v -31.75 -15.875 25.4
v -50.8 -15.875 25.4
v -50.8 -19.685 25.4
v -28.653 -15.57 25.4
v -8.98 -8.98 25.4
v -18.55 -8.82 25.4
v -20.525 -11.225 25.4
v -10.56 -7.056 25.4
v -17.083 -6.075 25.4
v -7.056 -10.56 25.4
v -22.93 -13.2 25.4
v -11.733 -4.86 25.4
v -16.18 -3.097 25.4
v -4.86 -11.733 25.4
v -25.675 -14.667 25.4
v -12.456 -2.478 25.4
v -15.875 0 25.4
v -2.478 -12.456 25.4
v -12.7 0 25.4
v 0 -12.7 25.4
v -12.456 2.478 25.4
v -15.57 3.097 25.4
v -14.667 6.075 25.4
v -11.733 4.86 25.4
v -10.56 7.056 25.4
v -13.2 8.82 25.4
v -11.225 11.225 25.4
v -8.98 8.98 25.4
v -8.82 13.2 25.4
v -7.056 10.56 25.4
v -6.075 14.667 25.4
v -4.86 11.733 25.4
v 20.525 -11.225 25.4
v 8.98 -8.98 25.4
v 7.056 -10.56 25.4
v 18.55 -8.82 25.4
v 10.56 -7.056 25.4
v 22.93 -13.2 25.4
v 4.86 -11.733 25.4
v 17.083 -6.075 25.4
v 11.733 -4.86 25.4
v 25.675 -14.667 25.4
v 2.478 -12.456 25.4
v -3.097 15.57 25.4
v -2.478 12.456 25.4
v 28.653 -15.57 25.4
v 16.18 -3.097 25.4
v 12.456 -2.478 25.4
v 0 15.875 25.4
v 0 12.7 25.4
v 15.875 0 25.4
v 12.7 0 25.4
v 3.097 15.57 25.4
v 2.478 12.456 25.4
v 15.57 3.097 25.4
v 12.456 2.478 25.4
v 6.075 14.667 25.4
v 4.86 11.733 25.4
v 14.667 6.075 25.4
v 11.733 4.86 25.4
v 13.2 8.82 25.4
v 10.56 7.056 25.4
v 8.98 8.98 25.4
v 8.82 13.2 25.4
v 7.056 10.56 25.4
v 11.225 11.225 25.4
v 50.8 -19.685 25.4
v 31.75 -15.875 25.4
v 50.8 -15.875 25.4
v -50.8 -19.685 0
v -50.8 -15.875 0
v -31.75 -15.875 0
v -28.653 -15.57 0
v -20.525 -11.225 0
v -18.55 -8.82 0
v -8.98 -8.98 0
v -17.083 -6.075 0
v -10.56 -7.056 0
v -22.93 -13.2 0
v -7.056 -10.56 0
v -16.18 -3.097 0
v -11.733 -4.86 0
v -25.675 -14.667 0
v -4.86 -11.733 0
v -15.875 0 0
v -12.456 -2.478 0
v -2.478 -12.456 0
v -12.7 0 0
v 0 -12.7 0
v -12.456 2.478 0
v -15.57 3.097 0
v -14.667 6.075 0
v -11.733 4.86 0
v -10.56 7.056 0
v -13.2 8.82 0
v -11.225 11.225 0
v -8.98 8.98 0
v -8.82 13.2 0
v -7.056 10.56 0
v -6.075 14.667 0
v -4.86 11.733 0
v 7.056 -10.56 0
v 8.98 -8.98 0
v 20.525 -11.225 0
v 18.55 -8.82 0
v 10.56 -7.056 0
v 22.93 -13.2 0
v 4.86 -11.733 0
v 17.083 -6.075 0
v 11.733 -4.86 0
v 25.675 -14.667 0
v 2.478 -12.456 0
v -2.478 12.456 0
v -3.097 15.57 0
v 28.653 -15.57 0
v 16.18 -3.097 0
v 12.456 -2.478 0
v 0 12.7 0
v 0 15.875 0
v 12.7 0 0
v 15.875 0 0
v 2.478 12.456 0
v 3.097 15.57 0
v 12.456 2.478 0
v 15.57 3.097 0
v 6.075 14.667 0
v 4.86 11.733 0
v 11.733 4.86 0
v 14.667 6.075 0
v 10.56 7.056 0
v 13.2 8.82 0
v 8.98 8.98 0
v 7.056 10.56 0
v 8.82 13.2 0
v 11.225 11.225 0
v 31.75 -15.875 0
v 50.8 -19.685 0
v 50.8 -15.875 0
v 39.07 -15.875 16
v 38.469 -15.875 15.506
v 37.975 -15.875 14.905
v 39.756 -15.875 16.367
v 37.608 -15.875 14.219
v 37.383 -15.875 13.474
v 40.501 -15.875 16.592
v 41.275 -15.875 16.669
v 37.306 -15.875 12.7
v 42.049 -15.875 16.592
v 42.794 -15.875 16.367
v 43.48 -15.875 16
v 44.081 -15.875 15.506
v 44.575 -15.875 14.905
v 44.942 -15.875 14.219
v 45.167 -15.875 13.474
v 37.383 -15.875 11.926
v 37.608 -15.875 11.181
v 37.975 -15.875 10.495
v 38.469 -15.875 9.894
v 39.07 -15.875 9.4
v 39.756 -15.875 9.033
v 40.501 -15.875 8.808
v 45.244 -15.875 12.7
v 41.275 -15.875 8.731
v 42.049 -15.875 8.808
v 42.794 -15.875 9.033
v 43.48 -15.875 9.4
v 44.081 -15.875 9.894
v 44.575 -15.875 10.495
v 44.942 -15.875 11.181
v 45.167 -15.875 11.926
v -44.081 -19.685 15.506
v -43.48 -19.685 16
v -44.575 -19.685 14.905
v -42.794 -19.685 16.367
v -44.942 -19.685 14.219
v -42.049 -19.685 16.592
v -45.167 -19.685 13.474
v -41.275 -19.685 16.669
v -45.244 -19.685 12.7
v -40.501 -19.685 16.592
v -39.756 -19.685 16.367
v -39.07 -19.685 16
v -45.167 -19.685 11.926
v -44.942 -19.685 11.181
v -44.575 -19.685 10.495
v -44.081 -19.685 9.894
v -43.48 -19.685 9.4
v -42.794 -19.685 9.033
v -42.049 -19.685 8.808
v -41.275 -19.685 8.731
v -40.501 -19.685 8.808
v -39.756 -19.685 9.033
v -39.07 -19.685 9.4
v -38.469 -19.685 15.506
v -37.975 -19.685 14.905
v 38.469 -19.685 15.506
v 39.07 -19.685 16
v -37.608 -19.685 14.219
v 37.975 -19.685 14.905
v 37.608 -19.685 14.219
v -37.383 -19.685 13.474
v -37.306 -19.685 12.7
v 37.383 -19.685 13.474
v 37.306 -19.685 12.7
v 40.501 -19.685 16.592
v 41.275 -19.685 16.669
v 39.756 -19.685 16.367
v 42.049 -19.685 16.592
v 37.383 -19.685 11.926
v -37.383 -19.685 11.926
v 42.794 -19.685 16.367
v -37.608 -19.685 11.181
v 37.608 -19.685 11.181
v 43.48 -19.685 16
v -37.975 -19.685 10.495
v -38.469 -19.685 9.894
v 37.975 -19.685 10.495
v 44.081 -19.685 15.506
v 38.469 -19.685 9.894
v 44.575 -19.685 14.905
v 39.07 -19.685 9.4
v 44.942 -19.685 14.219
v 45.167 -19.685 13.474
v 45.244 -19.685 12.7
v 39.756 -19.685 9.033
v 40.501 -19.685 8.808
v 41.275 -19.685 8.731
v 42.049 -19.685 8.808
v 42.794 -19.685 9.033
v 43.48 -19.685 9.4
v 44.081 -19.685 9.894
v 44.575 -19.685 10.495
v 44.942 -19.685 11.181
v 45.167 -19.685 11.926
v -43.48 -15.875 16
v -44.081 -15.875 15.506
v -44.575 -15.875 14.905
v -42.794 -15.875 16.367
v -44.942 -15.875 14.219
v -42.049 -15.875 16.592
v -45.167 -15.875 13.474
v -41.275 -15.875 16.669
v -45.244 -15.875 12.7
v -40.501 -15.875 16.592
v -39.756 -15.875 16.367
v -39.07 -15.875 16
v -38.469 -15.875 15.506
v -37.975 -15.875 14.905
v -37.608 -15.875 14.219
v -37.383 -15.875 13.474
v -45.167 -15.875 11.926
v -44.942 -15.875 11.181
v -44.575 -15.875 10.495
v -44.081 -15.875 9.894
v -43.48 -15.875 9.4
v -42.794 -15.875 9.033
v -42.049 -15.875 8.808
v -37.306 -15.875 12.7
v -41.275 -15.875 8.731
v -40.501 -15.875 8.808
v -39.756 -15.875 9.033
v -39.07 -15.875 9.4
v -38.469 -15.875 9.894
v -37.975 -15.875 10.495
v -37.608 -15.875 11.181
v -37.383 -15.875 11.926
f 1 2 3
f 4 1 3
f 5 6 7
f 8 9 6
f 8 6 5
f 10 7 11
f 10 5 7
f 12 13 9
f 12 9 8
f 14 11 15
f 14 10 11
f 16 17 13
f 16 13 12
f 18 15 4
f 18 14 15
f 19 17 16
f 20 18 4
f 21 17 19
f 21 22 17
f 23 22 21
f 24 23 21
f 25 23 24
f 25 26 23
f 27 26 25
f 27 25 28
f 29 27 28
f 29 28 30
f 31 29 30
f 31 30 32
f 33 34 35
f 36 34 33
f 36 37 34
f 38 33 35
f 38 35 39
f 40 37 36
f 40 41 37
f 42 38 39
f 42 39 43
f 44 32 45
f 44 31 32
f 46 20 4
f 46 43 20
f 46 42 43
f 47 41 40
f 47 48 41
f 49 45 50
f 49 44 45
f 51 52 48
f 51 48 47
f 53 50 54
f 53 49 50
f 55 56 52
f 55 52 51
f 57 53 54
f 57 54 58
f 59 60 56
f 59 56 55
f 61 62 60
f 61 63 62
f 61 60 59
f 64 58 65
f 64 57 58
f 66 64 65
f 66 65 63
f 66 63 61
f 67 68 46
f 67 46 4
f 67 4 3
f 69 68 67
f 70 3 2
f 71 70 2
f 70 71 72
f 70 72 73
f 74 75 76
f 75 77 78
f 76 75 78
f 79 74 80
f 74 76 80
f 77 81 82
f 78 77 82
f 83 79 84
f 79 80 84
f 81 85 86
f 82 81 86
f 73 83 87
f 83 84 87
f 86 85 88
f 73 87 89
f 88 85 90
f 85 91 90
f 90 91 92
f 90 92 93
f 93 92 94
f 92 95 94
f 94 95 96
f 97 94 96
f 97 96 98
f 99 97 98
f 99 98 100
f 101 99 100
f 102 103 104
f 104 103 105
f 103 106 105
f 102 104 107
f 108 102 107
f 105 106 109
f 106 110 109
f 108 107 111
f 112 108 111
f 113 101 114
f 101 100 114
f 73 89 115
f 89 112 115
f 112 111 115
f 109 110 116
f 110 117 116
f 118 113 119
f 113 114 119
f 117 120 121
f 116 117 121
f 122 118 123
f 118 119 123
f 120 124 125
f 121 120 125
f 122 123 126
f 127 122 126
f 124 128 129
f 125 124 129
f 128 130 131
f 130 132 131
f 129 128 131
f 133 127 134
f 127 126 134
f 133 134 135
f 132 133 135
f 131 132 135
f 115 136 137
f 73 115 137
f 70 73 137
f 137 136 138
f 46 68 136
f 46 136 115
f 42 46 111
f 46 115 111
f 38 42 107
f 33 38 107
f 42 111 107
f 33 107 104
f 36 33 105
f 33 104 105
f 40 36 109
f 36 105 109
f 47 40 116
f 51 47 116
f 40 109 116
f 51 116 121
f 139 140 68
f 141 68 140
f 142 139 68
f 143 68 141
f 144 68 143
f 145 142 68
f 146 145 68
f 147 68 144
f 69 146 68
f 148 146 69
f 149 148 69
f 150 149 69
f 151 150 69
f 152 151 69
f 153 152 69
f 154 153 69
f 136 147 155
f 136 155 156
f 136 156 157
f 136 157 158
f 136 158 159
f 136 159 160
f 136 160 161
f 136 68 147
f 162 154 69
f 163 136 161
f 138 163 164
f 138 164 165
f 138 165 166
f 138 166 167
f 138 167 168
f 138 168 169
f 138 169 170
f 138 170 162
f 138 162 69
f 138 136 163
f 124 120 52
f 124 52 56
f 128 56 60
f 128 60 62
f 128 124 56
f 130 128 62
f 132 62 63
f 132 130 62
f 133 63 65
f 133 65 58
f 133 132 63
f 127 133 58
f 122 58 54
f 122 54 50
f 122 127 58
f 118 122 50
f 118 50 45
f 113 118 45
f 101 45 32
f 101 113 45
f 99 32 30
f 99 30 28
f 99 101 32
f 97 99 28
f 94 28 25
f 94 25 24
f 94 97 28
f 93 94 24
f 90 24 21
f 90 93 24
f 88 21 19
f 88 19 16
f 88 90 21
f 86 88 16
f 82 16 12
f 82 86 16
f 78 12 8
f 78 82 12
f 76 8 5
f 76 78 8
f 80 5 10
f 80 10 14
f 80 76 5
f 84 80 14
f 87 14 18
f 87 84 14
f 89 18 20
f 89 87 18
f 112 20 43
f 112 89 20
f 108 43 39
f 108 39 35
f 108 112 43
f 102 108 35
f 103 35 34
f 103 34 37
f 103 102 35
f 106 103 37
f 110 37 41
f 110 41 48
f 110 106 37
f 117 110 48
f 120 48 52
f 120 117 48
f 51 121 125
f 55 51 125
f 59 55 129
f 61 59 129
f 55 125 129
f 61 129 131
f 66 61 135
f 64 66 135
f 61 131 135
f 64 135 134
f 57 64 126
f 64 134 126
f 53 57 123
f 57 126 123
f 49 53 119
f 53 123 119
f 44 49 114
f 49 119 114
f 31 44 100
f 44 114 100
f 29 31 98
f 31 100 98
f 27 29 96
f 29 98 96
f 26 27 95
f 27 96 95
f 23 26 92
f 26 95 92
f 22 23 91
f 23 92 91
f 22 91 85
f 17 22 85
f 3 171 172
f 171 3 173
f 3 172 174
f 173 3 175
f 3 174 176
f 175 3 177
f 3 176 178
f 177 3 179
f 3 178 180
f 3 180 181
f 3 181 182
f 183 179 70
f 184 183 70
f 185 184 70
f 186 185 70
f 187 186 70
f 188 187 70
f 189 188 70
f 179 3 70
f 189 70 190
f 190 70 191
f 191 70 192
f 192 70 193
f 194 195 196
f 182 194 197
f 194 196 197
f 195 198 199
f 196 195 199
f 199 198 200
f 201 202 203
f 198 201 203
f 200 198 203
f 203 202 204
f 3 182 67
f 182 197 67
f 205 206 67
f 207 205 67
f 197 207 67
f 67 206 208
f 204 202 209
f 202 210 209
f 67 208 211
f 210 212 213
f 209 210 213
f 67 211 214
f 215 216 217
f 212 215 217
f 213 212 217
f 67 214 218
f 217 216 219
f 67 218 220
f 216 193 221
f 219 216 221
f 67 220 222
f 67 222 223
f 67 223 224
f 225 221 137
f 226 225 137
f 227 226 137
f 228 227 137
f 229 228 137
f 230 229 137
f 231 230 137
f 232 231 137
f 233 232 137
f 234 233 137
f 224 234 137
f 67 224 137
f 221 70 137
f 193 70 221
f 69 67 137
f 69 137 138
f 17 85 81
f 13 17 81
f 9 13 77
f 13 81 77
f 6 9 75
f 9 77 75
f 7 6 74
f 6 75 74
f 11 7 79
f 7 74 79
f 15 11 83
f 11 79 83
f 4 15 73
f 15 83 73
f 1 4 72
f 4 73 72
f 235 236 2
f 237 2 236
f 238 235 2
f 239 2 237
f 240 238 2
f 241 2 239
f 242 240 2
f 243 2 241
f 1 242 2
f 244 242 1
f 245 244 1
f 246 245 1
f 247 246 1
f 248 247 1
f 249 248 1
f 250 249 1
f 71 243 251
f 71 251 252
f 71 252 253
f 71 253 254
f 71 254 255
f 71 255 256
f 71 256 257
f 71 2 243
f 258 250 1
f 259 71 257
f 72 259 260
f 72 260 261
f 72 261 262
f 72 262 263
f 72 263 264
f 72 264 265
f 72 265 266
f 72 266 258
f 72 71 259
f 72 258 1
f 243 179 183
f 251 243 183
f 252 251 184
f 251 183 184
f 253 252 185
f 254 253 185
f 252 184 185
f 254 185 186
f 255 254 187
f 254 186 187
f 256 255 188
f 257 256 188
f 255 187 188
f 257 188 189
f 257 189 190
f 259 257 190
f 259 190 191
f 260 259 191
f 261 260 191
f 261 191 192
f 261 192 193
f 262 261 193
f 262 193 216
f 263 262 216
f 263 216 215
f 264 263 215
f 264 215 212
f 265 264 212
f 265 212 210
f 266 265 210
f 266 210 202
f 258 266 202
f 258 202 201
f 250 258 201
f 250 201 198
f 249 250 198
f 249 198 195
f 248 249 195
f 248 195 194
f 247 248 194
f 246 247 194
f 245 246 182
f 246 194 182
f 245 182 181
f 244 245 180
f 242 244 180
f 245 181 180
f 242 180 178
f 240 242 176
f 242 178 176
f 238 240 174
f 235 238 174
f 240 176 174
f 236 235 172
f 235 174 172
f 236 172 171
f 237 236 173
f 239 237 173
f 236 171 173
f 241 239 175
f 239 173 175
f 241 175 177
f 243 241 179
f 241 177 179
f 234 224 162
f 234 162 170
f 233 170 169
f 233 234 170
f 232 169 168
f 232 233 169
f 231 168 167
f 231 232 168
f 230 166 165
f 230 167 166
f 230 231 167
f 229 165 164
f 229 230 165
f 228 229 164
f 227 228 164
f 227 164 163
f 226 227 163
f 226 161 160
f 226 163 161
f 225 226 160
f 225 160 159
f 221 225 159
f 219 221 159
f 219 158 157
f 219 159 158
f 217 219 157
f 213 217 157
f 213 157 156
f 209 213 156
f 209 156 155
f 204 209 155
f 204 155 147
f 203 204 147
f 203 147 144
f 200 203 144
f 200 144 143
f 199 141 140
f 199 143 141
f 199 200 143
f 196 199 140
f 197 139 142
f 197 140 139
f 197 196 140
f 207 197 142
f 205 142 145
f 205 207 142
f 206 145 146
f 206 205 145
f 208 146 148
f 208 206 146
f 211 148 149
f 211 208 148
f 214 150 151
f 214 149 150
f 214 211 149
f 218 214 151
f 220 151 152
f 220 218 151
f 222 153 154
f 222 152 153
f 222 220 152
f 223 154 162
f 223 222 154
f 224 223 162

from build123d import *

# Parameters (mm, degrees)
SKETCH1_R                      = 15.875
SKETCH1_R_2                    = 12.7
SKETCH1_W                      = 101.6
SKETCH1_H                      = 3.81
BOSS_EXTRUDE1_DEPTH            = 25.4
F_5_16_0_3125_DIAMETER_HOLE1_D = 7.9375


with BuildPart() as part:
    # Sketch1 → Boss-Extrude1 (new body)
    # profile 1 of 4: a face of its own
    with BuildSketch(Plane.XY):
        Circle(SKETCH1_R)
        Circle(SKETCH1_R_2, mode=Mode.SUBTRACT)
    # profile 2 of 4: a face of its own
    with BuildSketch(Plane.XY):
        with BuildLine():
            ThreePointArc((-15.875, 0), (-20.524679849, -11.225320151), (-31.75, -15.875))
            Line((-31.75, -15.875), (3.4e-08, -15.875))
            ThreePointArc((3.4e-08, -15.875), (-11.225320139, -11.225320163), (-15.875, 0))
        make_face()
    # profile 3 of 4: a face of its own
    with BuildSketch(Plane.XY):
        with BuildLine():
            ThreePointArc((15.875, 0), (11.225320163, -11.225320139), (3.4e-08, -15.875))
            Line((3.4e-08, -15.875), (31.75, -15.875))
            ThreePointArc((31.75, -15.875), (20.524679849, -11.225320151), (15.875, 0))
        make_face()
    # profile 4 of 4: a face of its own
    with BuildSketch(Plane.XY):
        with Locations((0, -17.78)):
            Rectangle(SKETCH1_W, SKETCH1_H)
    extrude(amount=BOSS_EXTRUDE1_DEPTH)

    # 5/16 (0.3125) Diameter Hole1 (through all)
    with Locations(Plane(origin=(-41.275, -15.875, 12.7), x_dir=(1, 0, 0), z_dir=(0, 1, 0))):
        with Locations((0, 0)):
            f_5_16_0_3125_diameter_hole1 = Hole(F_5_16_0_3125_DIAMETER_HOLE1_D / 2)

    # Mirror1: 5/16 (0.3125) Diameter Hole1 across plane
    add(f_5_16_0_3125_diameter_hole1.mirror(Plane(origin=(0, 0, 0), x_dir=(0, 0, 1), z_dir=(1, 0, 0))), mode=Mode.SUBTRACT)


solid = part.part
